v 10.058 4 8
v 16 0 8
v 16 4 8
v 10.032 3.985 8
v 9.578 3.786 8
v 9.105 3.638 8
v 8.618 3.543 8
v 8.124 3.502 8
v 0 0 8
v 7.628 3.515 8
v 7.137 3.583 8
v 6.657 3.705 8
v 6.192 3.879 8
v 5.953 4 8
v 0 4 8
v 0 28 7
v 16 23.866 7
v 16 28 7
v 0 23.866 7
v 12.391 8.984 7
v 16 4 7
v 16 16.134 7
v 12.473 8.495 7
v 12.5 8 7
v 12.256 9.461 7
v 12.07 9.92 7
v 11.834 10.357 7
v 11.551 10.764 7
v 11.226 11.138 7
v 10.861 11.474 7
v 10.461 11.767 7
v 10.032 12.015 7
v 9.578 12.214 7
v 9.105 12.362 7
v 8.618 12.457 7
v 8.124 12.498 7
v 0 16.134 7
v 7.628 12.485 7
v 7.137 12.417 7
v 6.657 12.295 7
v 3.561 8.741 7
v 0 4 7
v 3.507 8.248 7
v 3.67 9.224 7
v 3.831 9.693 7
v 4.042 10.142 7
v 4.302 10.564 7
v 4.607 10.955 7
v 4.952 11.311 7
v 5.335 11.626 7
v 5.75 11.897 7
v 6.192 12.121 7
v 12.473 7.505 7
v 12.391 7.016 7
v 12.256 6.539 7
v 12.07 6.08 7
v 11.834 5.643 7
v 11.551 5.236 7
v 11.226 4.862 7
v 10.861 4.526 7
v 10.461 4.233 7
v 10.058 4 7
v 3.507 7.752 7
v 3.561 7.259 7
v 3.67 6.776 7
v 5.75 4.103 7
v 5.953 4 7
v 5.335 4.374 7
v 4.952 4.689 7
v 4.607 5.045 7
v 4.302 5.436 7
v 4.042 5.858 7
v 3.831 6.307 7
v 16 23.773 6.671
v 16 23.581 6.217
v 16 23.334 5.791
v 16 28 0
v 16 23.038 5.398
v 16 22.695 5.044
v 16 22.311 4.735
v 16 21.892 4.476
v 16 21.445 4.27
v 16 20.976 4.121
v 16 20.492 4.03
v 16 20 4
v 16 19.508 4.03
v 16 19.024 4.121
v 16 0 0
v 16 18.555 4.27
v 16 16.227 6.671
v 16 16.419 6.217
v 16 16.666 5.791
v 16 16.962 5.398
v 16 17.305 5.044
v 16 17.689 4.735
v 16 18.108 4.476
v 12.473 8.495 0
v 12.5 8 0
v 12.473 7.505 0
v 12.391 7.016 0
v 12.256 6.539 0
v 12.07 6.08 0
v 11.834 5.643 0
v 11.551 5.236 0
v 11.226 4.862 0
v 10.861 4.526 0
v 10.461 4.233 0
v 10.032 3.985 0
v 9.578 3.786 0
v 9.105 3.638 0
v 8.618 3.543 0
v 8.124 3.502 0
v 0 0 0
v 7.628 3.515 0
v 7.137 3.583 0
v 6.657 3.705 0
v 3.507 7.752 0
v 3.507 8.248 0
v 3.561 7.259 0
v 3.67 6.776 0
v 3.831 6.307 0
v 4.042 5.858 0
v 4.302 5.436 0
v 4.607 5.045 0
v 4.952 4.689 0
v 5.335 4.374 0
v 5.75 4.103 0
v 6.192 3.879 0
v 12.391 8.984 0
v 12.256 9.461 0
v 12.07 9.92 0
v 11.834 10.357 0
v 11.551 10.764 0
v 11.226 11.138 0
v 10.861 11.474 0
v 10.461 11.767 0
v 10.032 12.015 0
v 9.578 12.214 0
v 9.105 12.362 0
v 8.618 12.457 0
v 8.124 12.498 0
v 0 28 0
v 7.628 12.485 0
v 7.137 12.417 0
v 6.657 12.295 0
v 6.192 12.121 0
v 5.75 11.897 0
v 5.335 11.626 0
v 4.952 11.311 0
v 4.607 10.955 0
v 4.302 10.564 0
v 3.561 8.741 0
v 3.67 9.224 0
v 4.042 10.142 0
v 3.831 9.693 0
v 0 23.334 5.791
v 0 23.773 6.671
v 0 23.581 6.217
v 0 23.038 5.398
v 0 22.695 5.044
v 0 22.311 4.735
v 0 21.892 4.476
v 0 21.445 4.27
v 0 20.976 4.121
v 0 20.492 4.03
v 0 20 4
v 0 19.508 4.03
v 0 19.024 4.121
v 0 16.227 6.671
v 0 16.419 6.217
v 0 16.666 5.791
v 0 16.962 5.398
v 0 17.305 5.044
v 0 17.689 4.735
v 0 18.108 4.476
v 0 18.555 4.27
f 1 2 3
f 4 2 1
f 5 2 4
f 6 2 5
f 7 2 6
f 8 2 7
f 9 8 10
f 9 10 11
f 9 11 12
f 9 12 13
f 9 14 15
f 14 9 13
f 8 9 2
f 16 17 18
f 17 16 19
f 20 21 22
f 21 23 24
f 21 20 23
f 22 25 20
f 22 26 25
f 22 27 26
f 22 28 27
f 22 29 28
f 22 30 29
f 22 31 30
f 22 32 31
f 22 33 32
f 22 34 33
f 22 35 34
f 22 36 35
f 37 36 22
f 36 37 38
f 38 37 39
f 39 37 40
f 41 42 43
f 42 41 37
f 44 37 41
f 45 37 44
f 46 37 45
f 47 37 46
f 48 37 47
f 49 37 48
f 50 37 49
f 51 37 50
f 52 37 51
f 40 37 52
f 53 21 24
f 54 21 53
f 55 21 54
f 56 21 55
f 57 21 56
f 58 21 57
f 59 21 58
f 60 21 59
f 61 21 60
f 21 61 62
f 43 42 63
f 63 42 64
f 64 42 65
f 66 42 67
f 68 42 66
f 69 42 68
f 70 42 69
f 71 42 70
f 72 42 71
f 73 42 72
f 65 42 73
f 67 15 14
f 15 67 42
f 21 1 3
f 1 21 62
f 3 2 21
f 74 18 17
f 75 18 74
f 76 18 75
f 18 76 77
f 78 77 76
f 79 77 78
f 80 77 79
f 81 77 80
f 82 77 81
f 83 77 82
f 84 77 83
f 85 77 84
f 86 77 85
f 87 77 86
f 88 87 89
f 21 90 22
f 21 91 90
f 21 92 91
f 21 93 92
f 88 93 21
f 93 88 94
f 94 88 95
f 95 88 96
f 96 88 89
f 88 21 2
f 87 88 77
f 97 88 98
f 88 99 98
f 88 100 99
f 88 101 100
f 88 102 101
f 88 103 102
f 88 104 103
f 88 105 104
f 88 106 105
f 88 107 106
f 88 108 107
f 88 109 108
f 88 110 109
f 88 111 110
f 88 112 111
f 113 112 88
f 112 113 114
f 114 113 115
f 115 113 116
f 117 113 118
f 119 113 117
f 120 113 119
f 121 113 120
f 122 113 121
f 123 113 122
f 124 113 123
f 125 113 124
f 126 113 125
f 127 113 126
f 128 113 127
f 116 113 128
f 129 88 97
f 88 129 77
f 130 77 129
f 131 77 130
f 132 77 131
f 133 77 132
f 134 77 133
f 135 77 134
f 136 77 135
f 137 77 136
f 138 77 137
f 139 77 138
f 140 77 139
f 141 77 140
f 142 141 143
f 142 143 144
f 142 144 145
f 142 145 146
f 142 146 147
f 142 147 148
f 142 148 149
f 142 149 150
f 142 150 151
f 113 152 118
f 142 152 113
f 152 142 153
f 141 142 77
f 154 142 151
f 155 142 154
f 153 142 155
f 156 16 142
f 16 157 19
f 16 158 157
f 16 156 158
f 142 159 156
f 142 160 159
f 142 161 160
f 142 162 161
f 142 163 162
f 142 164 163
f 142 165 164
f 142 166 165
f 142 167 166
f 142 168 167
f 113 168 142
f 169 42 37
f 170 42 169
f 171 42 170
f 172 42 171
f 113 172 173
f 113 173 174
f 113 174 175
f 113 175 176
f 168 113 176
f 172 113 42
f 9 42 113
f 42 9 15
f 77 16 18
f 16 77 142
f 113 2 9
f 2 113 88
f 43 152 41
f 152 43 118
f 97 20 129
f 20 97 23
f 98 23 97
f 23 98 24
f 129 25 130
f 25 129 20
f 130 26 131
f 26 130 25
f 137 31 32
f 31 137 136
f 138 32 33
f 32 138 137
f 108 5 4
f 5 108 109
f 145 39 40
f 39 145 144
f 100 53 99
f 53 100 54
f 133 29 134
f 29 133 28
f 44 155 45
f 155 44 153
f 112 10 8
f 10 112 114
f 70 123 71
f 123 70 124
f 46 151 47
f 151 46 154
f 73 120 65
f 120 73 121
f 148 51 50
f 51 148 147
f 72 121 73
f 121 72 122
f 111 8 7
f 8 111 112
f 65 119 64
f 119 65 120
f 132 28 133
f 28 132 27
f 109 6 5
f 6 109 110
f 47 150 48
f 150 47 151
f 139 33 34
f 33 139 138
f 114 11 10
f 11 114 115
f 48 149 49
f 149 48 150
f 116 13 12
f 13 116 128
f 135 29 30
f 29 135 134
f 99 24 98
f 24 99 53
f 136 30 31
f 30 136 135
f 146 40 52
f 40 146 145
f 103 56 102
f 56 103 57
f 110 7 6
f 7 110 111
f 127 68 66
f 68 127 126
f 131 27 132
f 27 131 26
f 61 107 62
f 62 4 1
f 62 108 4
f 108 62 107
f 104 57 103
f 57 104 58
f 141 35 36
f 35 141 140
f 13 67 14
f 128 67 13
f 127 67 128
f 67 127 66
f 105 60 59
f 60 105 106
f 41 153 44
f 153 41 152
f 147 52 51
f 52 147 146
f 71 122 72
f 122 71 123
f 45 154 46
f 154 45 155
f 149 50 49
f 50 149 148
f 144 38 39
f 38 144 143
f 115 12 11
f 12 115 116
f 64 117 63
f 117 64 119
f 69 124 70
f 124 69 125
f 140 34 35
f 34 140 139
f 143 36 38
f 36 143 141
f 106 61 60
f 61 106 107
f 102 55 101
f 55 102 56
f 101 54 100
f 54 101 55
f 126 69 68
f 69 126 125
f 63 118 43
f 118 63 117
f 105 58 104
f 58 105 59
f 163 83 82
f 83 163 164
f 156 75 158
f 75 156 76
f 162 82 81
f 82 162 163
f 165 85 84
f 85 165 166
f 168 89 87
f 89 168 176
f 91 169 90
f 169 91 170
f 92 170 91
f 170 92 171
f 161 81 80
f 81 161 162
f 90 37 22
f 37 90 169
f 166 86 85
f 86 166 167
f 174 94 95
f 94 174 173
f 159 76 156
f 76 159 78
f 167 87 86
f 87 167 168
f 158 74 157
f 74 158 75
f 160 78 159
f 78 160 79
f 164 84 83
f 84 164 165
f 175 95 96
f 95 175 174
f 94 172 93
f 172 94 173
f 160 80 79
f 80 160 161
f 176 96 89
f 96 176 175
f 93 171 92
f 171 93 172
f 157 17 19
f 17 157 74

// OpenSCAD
// Frame parts for OpenAutoLab
// X-mount connects two rods with non-complanar perpendicular axes, forming a shape similar to letter X
// T-mount holds two rods with complanar axes, forming a shape similar to letter T
// Nut spinner is a circular wrench, which may speed up threading nuts on long rods
//
// Copyright (c) 2023-2024 Kauzerei <mailto:openautolab@kauzerei.de>
//
// This program is free software: you can redistribute it and/or modify
// it under the terms of the GNU General Public License as published by
// the Free Software Foundation, either version 3 of the License, or
// (at your option) any later version.
//
// This program is distributed in the hope that it will be useful,
// but WITHOUT ANY WARRANTY; without even the implied warranty of
// MERCHANTABILITY or FITNESS FOR A PARTICULAR PURPOSE. See the
// GNU General Public License for more details.
//
// You should have received a copy of the GNU General Public License
// along with this program. If not, see <https://www.gnu.org/licenses/>. 

$fs=0.5/1;
$fa=1/1;
part="X-mount";// [X-mount, T-mount, OPTIONAL_nut_spinner]
rod_diameter=8;
nut_width=16;
nut_height=8;
air_gap=0.5;
tightening_gap=2;
d=rod_diameter+air_gap*2;

module hole(mount_hole=4.5,layer=0.4) { //hole for clamping with threaded screw
  translate([0,0,layer])cylinder(d=mount_hole,h=nut_width);
  mirror([0,0,1])cylinder(d=mount_hole*2,h=nut_width,$fn=6);
}

module xmount(thickness=16,diameter=8,air_gap=0.5,half=false,slot=2) {
  difference() {
    cube([thickness, 1.5*thickness+diameter/2,thickness]);
    translate([thickness/2,thickness/2,-0.01])cylinder(d=diameter+2*air_gap,h=thickness+0.02);
    translate([-0.01,thickness+diameter/2,thickness/2])rotate([0,90,0])cylinder(d=diameter,h=thickness+0.02);
    if(half) {
      translate([-0.01,-0.01,(thickness)/2])cube([thickness+0.02, 1.5*thickness+diameter/2+0.02,thickness]);
      translate([-0.01,(thickness-diameter)/2,(thickness-slot)/2])cube([thickness+0.02, 1.5*thickness+diameter/2+0.02,thickness]);
    }
  }
}

module tmount_legacy(thickness=16,diameter=8,air_gap=0.5,half=false,slot=2) {
  difference() {
    cube([thickness, 1.5*thickness+diameter/2,thickness]);
    translate([thickness/2,thickness/2,-0.01])cylinder(d=diameter,h=thickness+0.02);
    translate([thickness/2,thickness/2,thickness/2])rotate([-90,0,0])cylinder(d=diameter,h=thickness*2);
    if(half) {
      translate([-0.01,-0.01,(thickness)/2])cube([thickness+0.02, 1.5*thickness+diameter/2+0.02,thickness]);
      translate([-0.01,(thickness-diameter)/2,(thickness-slot)/2])cube([thickness+0.02, 1.5*thickness+diameter/2+0.02,thickness]);
    }
  }
}

module tmount(thickness=16,diameter=8,half=false,slot=2) {
  difference() {
    hull() {
      cube([thickness*2,thickness,thickness],center=true);
      translate([0,thickness,0])cube([thickness,thickness*2,thickness],center=true);
    }
    rotate([-90,0,0])cylinder (d=diameter,h=thickness*2+0.01);
    rotate([0,90,0])cylinder (d=diameter,h=thickness*2+0.01,center=true);
    translate([diameter,diameter,-air_gap-nut_width/4]) hole();
    translate([-diameter,diameter,-air_gap-nut_width/4]) hole();
    if(half) translate([-thickness-0.01,-thickness/2-0.01,-slot/2])cube([2*thickness+0.02, 2.5*thickness+0.02,thickness]);
  }
}

module nutspinner(d1,d2,d3,d4,d5,h) {
  difference() {
    cylinder(d=d1,h=h,center=true);
    hull() {
      cylinder(d=d5,h=h+0.02,center=true);
      translate([0,d1,0])cylinder(d=d5,h=h+0.02,center=true);
    }
    difference() {
      cylinder(d=d2,h=h+0.02,center=true);
      cylinder(d=d3,h=h+0.04,center=true);
      hull() {
        cylinder(d=d5+6,h=h+0.04,center=true);
        translate([0,d1,0])cylinder(d=d5+6,h=h+0.04,center=true);
      }
    }
    cylinder(d=d4,h=h,$fn=6);
  }
}

if (part=="X-mount") {
  xmount(thickness=nut_width,diameter=rod_diameter,air_gap=air_gap,half=true,slot=tightening_gap);
}
if (part=="T-mount") {
  tmount(thickness=nut_width,diameter=rod_diameter,half=true,slot=tightening_gap);
}
if (part=="OPTIONAL_nut_spinner") {
  nutspinner(50,40,nut_width+6,nut_width+2*air_gap,rod_diameter+air_gap*2,nut_height*2);
}
